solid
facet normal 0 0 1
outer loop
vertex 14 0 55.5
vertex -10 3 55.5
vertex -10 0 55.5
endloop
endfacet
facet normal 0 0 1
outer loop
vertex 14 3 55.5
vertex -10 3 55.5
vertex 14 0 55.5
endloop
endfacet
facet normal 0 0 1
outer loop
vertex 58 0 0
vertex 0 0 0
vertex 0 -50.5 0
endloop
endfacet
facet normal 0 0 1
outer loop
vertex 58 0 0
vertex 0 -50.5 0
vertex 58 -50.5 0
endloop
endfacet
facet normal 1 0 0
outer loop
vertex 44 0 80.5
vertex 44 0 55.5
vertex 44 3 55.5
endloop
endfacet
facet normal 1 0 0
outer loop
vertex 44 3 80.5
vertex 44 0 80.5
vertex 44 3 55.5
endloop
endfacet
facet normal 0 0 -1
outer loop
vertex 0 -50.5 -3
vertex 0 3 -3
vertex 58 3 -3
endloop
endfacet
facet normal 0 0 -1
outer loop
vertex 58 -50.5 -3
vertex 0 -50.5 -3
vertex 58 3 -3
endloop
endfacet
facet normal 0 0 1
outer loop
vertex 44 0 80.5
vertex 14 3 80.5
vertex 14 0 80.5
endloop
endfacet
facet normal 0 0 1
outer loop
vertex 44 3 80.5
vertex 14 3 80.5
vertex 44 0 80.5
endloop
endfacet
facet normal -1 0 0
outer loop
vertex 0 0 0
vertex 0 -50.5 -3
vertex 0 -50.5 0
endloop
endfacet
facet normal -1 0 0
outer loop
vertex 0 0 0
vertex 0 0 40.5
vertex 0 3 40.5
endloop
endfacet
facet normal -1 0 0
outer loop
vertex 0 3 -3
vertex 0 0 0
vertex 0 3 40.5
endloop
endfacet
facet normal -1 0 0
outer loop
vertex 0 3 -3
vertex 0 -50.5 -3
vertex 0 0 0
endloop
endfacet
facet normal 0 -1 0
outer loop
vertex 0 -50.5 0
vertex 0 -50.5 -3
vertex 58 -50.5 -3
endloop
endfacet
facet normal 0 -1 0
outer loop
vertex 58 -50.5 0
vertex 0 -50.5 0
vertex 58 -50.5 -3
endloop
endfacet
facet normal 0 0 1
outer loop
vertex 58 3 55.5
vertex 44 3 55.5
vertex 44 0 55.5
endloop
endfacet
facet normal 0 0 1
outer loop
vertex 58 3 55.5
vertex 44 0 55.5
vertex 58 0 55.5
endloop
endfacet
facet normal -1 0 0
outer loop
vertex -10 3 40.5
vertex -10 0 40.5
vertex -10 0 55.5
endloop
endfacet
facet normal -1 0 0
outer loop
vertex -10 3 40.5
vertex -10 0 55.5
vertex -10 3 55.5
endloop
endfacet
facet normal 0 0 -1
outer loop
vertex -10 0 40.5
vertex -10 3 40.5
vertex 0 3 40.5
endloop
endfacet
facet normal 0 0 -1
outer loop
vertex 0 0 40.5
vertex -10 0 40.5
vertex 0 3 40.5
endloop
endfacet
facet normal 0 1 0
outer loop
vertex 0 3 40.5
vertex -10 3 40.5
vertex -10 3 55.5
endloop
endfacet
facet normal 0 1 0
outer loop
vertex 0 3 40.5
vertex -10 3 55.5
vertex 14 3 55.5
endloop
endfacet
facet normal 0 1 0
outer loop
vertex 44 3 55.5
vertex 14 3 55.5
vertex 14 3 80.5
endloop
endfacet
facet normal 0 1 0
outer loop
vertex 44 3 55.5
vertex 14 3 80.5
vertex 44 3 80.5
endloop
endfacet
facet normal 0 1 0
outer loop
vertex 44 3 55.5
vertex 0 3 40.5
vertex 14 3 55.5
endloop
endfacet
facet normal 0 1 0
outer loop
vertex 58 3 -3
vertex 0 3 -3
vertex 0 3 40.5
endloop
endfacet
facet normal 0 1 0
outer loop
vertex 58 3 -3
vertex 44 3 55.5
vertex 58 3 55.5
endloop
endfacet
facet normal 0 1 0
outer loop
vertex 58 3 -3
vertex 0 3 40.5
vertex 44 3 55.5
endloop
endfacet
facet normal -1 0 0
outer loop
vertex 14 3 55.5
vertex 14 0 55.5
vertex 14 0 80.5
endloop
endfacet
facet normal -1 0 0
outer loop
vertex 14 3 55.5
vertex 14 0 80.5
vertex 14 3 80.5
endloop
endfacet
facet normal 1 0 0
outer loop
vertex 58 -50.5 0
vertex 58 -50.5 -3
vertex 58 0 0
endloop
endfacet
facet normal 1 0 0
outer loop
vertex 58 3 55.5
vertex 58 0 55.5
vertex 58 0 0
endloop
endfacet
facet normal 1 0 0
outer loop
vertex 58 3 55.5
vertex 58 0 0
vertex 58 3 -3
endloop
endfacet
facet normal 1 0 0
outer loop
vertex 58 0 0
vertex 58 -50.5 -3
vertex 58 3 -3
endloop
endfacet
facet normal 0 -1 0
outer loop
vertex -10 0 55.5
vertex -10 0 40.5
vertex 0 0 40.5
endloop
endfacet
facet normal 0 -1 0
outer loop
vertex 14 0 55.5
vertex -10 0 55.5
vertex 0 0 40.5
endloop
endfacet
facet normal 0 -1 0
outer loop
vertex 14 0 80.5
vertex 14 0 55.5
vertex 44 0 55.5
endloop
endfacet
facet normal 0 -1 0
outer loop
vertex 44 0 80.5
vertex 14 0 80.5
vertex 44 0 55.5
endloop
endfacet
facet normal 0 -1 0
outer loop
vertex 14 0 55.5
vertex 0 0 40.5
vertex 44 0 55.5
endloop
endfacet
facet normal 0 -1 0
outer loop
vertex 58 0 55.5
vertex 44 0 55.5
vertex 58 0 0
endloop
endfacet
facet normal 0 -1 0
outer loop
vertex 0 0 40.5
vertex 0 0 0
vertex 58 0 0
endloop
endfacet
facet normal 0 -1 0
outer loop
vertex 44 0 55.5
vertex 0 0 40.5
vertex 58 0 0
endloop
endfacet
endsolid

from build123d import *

# Parameters (mm, degrees)
BOX015001038_W     = 58
BOX015001038_H     = 53.5
BOX015001038_DEPTH = 3
BOX015001039_W     = 10
BOX015001039_H     = 3
BOX015001039_DEPTH = 15
BOX015001041_W     = 14
BOX015001041_H     = 10
BOX015001041_DEPTH = 25
BOX015001040_W     = 14
BOX015001040_H     = 10
BOX015001040_DEPTH = 25
BOX015001037_W     = 58
BOX015001037_H     = 3
BOX015001037_DEPTH = 80.5


with BuildPart() as cube034:
    # Box015001038 → Box015001038 (new body)
    with BuildSketch(Plane(origin=(0, -50.5, -3), x_dir=(1, 0, 0), z_dir=(0, 0, 1))):
        with Locations((29, 26.75)):
            Rectangle(BOX015001038_W, BOX015001038_H)
    extrude(amount=BOX015001038_DEPTH)


with BuildPart() as cube035:
    # Box015001039 → Box015001039 (new body)
    with BuildSketch(Plane(origin=(-10, 0, 40.5), x_dir=(1, 0, 0), z_dir=(0, 0, 1))):
        with Locations((5, 1.5)):
            Rectangle(BOX015001039_W, BOX015001039_H)
    extrude(amount=BOX015001039_DEPTH)


with BuildPart() as cube037:
    # Box015001041 → Box015001041 (new body)
    with BuildSketch(Plane(origin=(44, 0, 55.5), x_dir=(1, 0, 0), z_dir=(0, 0, 1))):
        with Locations((7, 5)):
            Rectangle(BOX015001041_W, BOX015001041_H)
    extrude(amount=BOX015001041_DEPTH)


with BuildPart() as cube036:
    # Box015001040 → Box015001040 (new body)
    with BuildSketch(Plane.XY.offset(55.5)):
        with Locations((7, 5)):
            Rectangle(BOX015001040_W, BOX015001040_H)
    extrude(amount=BOX015001040_DEPTH)


with BuildPart() as fusion001019007:
    # Box015001037 → Box015001037 (new body)
    with BuildSketch(Plane.XY):
        with Locations((29, 1.5)):
            Rectangle(BOX015001037_W, BOX015001037_H)
    extrude(amount=BOX015001037_DEPTH)

    # Cut003047: cut Cube036
    add(cube036.part, mode=Mode.SUBTRACT)

    # Cut003048: cut Cube037
    add(cube037.part, mode=Mode.SUBTRACT)

    # Fusion001019006: union Cube035
    add(cube035.part)

    # Fusion001019007: union Cube034
    add(cube034.part)


solid = fusion001019007.part
